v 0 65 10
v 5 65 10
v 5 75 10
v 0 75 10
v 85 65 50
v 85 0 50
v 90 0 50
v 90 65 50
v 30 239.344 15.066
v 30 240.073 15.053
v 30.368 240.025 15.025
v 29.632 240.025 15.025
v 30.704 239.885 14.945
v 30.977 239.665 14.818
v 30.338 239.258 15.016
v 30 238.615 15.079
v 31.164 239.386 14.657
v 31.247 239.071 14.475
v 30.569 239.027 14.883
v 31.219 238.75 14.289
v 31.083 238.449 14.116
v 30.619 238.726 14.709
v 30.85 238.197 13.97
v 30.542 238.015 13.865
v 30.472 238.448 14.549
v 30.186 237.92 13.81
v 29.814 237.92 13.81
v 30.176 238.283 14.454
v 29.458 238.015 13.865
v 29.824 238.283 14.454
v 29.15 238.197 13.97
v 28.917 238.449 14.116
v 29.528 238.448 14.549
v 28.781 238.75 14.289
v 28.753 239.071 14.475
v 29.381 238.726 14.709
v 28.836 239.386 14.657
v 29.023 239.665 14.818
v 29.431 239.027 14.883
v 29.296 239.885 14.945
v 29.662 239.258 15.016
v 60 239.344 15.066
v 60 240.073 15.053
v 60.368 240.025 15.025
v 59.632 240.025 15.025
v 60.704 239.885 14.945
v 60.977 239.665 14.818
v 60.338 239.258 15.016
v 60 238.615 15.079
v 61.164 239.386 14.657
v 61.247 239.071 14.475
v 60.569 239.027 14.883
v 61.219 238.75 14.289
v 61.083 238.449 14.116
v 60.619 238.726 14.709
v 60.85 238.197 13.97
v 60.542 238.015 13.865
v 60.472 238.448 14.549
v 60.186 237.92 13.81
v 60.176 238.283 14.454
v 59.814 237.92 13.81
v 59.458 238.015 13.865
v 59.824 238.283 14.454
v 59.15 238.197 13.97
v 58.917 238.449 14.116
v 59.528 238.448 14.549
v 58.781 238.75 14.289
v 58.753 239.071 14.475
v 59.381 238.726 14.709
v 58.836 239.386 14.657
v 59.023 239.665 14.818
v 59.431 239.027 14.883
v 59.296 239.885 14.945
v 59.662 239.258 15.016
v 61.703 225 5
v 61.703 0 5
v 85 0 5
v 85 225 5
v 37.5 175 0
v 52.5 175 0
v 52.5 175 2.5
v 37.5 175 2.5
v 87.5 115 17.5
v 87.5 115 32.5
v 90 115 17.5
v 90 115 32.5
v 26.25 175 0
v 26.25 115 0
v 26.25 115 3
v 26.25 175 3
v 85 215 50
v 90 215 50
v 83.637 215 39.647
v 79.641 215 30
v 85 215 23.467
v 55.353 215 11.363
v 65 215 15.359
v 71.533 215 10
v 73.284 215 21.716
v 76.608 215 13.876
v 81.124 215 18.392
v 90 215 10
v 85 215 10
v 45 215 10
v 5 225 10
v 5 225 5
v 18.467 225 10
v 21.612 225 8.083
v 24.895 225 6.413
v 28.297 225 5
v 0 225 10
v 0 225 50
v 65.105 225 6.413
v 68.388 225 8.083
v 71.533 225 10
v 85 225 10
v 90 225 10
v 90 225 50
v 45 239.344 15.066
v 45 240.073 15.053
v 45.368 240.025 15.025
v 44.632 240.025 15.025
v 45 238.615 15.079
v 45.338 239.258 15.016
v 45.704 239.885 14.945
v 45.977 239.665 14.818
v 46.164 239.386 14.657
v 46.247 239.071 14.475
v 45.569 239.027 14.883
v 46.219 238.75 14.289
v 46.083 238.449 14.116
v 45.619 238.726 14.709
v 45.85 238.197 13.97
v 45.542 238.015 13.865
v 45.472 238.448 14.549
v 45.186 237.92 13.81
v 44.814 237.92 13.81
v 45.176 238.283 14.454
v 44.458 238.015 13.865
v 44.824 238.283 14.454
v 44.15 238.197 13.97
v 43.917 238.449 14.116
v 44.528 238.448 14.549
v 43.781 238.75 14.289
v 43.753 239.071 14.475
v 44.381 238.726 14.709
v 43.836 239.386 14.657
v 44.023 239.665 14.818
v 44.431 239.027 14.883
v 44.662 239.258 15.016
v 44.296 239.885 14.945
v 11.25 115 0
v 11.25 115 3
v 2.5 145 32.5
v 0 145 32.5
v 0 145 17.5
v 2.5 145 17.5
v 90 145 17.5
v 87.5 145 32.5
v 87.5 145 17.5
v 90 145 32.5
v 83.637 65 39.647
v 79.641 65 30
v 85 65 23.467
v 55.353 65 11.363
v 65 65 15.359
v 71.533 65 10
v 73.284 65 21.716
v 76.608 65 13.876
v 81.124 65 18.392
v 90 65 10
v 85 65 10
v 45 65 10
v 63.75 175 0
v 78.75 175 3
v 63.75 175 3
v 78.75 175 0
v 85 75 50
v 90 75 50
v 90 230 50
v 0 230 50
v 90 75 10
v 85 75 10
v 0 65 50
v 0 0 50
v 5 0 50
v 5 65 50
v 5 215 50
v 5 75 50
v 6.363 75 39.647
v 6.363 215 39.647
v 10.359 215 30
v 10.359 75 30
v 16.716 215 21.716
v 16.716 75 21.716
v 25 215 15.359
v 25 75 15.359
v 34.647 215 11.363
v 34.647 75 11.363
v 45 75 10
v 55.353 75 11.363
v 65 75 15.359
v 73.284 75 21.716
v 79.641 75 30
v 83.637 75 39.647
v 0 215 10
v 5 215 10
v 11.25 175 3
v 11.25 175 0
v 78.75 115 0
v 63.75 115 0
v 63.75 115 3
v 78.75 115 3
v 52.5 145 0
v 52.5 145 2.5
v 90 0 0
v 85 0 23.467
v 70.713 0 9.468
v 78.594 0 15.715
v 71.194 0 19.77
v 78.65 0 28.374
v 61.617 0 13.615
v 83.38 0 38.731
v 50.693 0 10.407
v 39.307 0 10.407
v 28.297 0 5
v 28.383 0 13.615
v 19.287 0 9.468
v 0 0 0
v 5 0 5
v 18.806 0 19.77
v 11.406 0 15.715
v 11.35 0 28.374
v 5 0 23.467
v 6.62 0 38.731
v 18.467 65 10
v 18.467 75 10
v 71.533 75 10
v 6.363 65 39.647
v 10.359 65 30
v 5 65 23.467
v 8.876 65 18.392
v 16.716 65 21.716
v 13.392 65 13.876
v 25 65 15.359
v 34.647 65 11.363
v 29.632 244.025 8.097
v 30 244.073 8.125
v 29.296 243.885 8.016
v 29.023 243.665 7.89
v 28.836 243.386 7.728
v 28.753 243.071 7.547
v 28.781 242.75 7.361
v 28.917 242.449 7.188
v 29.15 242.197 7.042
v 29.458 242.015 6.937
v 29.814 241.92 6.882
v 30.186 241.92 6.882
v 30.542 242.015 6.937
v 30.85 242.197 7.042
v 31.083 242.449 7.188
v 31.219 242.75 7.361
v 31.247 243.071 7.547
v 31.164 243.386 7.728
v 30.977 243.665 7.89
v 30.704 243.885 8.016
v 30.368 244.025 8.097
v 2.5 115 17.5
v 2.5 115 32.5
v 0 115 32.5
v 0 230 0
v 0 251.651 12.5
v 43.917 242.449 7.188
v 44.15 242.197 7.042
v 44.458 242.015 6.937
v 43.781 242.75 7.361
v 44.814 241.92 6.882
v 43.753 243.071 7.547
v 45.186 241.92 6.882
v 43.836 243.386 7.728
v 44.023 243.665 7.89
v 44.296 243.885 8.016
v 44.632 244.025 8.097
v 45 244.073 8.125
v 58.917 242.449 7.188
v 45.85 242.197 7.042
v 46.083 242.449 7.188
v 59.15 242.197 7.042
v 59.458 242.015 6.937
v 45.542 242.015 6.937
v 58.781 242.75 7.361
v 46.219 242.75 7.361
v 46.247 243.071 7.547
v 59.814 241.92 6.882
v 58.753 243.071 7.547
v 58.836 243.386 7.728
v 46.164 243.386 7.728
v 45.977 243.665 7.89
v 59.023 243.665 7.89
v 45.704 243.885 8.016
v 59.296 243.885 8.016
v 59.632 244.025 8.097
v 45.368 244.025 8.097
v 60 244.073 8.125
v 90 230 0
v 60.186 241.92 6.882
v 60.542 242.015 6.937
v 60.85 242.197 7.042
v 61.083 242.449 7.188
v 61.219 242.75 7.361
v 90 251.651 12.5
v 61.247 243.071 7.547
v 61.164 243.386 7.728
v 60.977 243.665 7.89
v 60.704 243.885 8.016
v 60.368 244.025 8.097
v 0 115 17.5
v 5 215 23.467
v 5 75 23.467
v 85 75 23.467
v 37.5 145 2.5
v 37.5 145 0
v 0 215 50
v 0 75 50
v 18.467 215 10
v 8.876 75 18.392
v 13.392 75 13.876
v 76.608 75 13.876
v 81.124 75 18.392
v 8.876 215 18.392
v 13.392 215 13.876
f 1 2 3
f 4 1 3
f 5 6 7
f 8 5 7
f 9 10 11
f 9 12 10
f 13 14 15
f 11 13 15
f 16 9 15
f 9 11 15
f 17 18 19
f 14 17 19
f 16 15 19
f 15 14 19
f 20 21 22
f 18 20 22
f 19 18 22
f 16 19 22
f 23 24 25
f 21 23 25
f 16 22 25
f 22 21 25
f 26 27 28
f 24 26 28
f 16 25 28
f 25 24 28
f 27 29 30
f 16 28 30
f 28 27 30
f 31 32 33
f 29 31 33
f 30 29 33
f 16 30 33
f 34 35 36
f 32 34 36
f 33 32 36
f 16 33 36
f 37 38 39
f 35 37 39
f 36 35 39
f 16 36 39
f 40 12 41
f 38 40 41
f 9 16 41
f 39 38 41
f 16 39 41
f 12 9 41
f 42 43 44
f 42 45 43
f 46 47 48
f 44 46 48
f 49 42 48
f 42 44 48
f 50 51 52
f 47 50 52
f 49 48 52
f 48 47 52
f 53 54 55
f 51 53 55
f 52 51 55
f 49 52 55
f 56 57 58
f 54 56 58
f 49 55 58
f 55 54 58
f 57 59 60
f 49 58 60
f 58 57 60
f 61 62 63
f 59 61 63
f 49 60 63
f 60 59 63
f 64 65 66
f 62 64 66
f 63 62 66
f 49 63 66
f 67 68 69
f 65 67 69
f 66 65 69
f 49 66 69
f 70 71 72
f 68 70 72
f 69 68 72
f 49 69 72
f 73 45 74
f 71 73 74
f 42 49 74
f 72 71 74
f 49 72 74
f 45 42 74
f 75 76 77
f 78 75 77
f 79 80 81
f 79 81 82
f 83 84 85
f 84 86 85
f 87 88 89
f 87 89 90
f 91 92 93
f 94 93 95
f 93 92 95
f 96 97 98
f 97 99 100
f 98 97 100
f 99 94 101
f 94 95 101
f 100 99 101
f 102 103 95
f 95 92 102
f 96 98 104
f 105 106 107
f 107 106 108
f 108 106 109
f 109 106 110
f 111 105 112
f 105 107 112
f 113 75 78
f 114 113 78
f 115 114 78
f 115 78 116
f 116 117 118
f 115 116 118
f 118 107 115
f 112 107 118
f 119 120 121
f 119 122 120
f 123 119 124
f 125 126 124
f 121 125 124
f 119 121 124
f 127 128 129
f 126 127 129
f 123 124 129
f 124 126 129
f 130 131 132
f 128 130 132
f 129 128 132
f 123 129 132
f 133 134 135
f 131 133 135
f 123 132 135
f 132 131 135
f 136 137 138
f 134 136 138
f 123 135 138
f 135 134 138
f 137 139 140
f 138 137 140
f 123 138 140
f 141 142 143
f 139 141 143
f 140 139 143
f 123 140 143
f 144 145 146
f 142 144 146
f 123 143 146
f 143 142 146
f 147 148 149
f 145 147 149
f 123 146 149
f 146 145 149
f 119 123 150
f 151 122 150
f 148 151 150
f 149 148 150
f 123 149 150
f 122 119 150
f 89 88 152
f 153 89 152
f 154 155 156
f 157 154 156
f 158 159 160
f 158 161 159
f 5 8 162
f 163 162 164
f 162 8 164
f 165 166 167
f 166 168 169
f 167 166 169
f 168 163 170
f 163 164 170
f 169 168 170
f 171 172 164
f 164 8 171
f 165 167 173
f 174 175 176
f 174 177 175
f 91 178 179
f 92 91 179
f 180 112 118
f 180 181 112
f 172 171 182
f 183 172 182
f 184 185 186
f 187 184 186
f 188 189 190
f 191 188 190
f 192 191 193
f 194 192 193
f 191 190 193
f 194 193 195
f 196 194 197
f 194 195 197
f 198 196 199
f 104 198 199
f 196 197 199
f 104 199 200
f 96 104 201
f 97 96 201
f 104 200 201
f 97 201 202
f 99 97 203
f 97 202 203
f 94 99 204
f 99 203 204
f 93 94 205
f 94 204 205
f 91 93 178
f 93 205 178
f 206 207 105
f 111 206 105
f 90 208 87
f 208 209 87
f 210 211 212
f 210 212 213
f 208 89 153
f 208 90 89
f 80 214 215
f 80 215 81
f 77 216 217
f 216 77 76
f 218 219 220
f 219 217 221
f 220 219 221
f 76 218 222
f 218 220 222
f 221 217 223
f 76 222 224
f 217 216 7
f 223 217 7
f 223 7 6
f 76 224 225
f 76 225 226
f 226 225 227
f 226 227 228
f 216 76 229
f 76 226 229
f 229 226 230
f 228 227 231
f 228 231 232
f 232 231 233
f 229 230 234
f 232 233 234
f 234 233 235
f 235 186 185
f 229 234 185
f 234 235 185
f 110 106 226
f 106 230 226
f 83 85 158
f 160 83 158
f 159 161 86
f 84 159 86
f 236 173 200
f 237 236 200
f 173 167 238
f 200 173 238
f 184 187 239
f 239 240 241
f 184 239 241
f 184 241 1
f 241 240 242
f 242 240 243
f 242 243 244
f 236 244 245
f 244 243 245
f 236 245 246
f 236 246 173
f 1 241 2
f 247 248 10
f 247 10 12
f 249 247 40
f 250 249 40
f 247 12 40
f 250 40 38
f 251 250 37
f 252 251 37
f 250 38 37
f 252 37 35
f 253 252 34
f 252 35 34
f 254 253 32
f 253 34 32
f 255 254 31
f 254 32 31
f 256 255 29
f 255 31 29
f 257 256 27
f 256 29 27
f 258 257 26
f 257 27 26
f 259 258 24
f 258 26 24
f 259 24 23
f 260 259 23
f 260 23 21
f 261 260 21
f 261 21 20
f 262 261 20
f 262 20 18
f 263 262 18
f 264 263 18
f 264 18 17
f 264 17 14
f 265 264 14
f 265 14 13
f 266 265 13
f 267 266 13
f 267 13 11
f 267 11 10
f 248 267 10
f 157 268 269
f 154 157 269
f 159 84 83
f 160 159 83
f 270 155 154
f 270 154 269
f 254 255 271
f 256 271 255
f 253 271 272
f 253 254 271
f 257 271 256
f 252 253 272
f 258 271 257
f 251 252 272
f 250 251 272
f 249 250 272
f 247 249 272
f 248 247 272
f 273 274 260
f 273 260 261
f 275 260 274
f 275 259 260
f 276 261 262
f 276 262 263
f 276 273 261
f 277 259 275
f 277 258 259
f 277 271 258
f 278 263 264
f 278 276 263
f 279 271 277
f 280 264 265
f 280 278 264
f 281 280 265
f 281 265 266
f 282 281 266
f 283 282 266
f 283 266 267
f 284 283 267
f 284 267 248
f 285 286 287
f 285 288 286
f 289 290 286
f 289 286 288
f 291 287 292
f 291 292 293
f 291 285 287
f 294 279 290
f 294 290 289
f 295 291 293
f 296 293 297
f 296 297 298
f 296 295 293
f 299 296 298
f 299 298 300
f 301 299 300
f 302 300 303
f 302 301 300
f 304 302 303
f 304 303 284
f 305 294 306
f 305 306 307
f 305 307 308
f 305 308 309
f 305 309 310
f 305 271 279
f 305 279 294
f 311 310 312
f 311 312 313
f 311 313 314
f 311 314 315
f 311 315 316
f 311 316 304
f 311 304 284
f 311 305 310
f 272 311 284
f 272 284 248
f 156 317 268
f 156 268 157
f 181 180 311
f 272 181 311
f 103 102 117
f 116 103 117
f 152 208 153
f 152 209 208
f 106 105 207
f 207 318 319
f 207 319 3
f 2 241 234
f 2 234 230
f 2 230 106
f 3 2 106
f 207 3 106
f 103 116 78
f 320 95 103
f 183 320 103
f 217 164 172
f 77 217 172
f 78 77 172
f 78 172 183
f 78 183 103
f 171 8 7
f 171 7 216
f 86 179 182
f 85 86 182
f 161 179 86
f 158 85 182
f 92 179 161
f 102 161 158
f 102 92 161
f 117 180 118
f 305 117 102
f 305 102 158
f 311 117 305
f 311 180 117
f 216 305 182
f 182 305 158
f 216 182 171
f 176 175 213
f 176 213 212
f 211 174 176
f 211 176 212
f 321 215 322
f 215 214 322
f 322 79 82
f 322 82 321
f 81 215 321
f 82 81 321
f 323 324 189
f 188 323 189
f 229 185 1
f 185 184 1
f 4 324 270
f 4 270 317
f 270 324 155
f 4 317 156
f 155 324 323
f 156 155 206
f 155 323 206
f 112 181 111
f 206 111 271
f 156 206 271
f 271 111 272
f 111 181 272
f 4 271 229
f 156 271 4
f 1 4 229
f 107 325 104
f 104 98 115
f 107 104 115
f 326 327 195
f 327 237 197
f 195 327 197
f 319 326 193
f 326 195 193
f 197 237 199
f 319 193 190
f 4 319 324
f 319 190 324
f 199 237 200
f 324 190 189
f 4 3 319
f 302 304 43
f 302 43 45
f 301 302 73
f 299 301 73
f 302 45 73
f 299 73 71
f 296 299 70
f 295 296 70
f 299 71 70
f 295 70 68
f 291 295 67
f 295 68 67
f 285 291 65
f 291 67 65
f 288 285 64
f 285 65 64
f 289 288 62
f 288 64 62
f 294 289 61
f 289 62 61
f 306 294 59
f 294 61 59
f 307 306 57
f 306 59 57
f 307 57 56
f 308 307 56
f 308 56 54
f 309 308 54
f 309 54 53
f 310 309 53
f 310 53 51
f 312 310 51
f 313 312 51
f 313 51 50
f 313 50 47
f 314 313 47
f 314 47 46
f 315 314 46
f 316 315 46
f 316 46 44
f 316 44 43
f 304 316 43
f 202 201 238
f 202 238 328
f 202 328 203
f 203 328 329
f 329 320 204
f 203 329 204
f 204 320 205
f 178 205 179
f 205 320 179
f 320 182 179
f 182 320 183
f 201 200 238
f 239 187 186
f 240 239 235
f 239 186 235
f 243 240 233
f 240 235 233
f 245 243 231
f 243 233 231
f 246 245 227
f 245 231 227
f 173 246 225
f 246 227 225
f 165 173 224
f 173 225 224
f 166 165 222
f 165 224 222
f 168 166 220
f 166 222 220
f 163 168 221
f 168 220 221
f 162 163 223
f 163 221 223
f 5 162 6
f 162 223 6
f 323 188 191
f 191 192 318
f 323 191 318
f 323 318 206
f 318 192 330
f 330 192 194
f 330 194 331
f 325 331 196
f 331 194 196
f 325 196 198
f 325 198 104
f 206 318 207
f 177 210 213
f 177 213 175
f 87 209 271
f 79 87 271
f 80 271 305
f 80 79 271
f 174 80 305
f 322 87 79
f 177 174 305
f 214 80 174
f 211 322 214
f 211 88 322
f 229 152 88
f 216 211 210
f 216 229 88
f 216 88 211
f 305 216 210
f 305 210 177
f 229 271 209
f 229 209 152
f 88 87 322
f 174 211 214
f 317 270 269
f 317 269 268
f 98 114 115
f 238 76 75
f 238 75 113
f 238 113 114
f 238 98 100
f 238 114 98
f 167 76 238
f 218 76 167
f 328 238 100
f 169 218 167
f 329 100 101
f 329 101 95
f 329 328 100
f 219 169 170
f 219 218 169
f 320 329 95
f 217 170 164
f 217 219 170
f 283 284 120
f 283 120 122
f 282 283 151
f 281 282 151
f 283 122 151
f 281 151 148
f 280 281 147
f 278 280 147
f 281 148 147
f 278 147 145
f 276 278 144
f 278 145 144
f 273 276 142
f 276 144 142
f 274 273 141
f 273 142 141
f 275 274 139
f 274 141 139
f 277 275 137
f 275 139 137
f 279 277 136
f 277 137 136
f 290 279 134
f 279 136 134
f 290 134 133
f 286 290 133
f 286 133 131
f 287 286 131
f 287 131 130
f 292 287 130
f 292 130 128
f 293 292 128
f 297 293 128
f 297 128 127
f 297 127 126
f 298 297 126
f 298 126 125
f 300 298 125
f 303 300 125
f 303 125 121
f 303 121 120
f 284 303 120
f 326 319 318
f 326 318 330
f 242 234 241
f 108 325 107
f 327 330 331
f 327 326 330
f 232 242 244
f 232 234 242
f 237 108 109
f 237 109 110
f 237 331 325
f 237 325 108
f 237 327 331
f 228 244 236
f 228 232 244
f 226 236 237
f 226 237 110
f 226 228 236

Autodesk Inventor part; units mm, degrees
ref_plane "YZ Plane" through (0, 0, 0) normal (1, 0, 0) x (0, 1, 0)
ref_plane "XZ Plane" through (0, 0, 0) normal (0, 1, 0) x (-1, 0, 0)
ref_plane "XY Plane" through (0, 0, 0) normal (0, 0, 1) x (1, 0, 0)
sketch "スケッチ1" plane through (0, 0, 0) normal (0, 1, 0) x (-1, 0, 0)
  line L0 (0, 0) -> (-90, 0)
  line L1 (-90, 0) -> (-90, 50)
  line L2 (0, 50) -> (0, 0)
  line L3 (0, 0) -> (-5, 0)
  line L4 (-5, 0) -> (-5, 50)
  line L5 (-5, 0) -> (-90, 0)
  line L6 (-90, 0) -> (-85, 0)
  line L7 (-85, 0) -> (-85, 50)
  arc A0 (-85, 50) -> (-5, 50) centre (-45, 50) ccw
  line L8 (0, 0) -> (0, 10)
  line L9 (0, 10) -> (-90, 10)
  circle A1 centre (-45, 50) radius 45
  line L10 (-90, 5) -> (0, 5)
  line L11 (-90, 50) -> (-85, 50)
  line L12 (-5, 50) -> (0, 50)
  line L13 (0, 0) -> (-90, 0)
  line L14 (-90, 0) -> (-90, 5)
  line L15 (-90, 5) -> (0, 5)
  line L16 (0, 5) -> (0, 0)
  dimension "d0" = 90
  dimension "d1" = 50
  dimension "d2" = 5
  dimension "d3" = 85
  dimension "d4" = 5
  dimension "d5" = 80
  dimension "d6" = 10
  dimension "d7" = 90
extrude "押し出し1" add sketch "スケッチ1" along normal blind 230 contours L0 L4 L10 L2 | L0 L7 L10 L4 | L10 L4 L9 L2 | L0 L1 L10 L7 | L10 A1 L9 L4 | L9 L4 A1 L2 | L10 L1 L9 L7 | L7 L9 A1 L10 | L9 A1 L4 | A1 L9 | A1 L4 L12 | L9 L1 A1 L7 | L7 A1 L9 | A1 L9 A0 L4 | A1 L7 A0 L9 | L11 L7 A1
sketch "スケッチ2" plane through (0, 0, 0) normal (0, -1, 0) x (1, 0, 0)
  line L0 (0, 0) -> (0, 50) projected
  line L1 (90, 0) -> (0, 0) projected
  line L2 (90, 50) -> (90, 0) projected
  line L3 (85, 50) -> (90, 50) projected
  arc A0 (5, 50) -> (85, 50) centre (45, 50) ccw projected
  line L4 (0, 50) -> (5, 50) projected
  arc A1 (5, 23.467) -> (85, 23.467) centre (45, 50) ccw
  line L5 (0, 5) -> (90, 5)
  line L6 (5, 23.467) -> (5, 5)
  line L7 (85, 23.467) -> (85, 5)
  dimension "d29" = 48
extrude "押し出し2" cut sketch "スケッチ2" against normal blind 225 contours L6 A1 L5 | L5 A1 L7
sketch "スケッチ3" plane through (0, 230, 0) normal (0, 1, 0) x (1, 0, 0)
  arc A0 (85, -50) -> (5, -50) centre (45, -50) ccw projected
  line L0 (90, -50) -> (90, 0) projected
  line L1 (0, -50) -> (5, -50) projected
  arc A1 (85, -50) -> (5, -50) centre (45, -50) ccw
  line L2 (5, -50) -> (85, -50)
extrude "押し出し3" add sketch "スケッチ3" against normal blind 5
sketch "スケッチ4" plane through (90, 0, 50) normal (1, 0, 0) x (0, 0, -1)
  line L0 (0, 0) -> (50, 0) projected
  line L1 (0, 0) -> (0, 230) projected
  line L2 (25, 0) -> (25, 65)
  line L3 (25, 65) -> (25, 75)
  line L4 (25, 75) -> (25, 215)
  line L5 (25, 215) -> (25, 225)
  line L6 (0, 65) -> (40, 65)
  line L7 (40, 65) -> (40, 75)
  line L8 (40, 75) -> (0, 75)
  line L9 (0, 75) -> (0, 65)
  line L10 (0, 215) -> (40, 215)
  line L11 (40, 215) -> (40, 225)
  line L12 (40, 225) -> (0, 225)
  line L13 (0, 225) -> (0, 215)
  dimension "d16" = 65
  dimension "d17" = 10
  dimension "d18" = 140
  dimension "d19" = 10
  dimension "d20" = 40
extrude "押し出し4" cut sketch "スケッチ4" against normal blind 90 contours L1 L8 L3 L6 | L3 L8 L7 L6 | L1 L12 L5 L10 | L5 L12 L11 L10
sketch "スケッチ6" plane through (90, 0, 50) normal (1, 0, 0) x (0, 0, -1)
  line L0 (0, 230) -> (50, 230) projected
  line L1 (50, 230) -> (37.5, 251.6506)
  line L2 (50, 230) -> (110, 230) construction
  line L3 (0, 230) -> (37.5, 251.6506)
  line L4 (0, 230) -> (43.3013, 230) construction
  dimension "d32" = 120
  dimension "d33" = 30
extrude "押し出し6" add sketch "スケッチ6" against normal blind 90
sketch "スケッチ9" plane through (0, 0, 0) normal (-1, 0, 0) x (0, 0, 1)
  line L0 (10, 225) -> (50, 225) projected
  line L1 (50, 225) -> (50, 230) projected
  line L2 (50, 230) -> (12.5, 251.6506) projected
  line L3 (12.5, 251.6506) -> (0, 230) projected
  line L4 (0, 0) -> (0, 230) projected
  line L5 (0, 0) -> (50, 0) projected
  line L6 (50, 0) -> (50, 65) projected
  line L7 (50, 65) -> (10, 65) projected
  line L8 (10, 65) -> (10, 75) projected
  line L9 (10, 75) -> (50, 75) projected
  line L10 (50, 75) -> (50, 215) projected
  line L11 (50, 215) -> (10, 215) projected
  line L12 (10, 215) -> (10, 225) projected
  line L13 (12.5, 251.6506) -> (0, 230)
  line L14 (0, 230) -> (-132.7906, 0)
  line L15 (0, 145) -> (-49.0748, 145)
  line L16 (0, 115) -> (-66.3953, 115)
  dimension "d45" = 30
sketch "スケッチ10" plane through (0, 0, 0) normal (-1, 0, 0) x (0, 0, 1)
  line L0 (10, 225) -> (50, 225) projected
  line L1 (50, 225) -> (50, 230) projected
  line L2 (50, 230) -> (12.5, 251.6506) projected
  line L3 (12.5, 251.6506) -> (0, 230) projected
  line L4 (0, 0) -> (0, 230) projected
  line L5 (0, 0) -> (50, 0) projected
  line L6 (50, 0) -> (50, 65) projected
  line L7 (50, 65) -> (10, 65) projected
  line L8 (10, 65) -> (10, 75) projected
  line L9 (10, 75) -> (50, 75) projected
  line L10 (50, 75) -> (50, 215) projected
  line L11 (50, 215) -> (10, 215) projected
  line L12 (10, 215) -> (10, 225) projected
  line L13 (12.5, 251.6506) -> (-87.5, 78.4456)
  line L14 (-87.5, 78.4456) -> (50, 0)
sketch "スケッチ11" plane through (90, 230, 0) normal (0, 0.5, -0.866) x (-1, 0, 0)
  line L0 (0, 25) -> (90, 25) projected
  line L1 (45, 25) -> (45, 15)
  line L2 (45, 15) -> (60, 15)
  line L3 (60, 15) -> (30, 15)
  point P0 (90, -199.1858)
  dimension "d49" = 10
  dimension "d50" = 15
  dimension "d51" = 30
hole "穴1" at (45, 242.9904, 7.5) at (30, 242.9904, 7.5) at (60, 242.9904, 7.5) direction (0, -0.5, 0.866) diameter 2.5 depth 8 tip angle 118
sketch "スケッチ12" plane through (90, 0, 50) normal (1, 0, 0) x (0, 0, -1)
  line L0 (50, 0) -> (50, 230) projected
  line L1 (40, 225) -> (40, 215) projected
  line L2 (0, 215) -> (0, 75)
  line L3 (0, 145) -> (50, 145)
  line L4 (32.5, 175) -> (17.5, 175)
  line L5 (17.5, 175) -> (17.5, 115)
  line L6 (17.5, 115) -> (32.5, 115)
  line L7 (32.5, 115) -> (32.5, 175)
  line L8 (32.5, 175) -> (17.5, 115) construction
  line L9 (17.5, 175) -> (32.5, 115) construction
  line L10 (17.5, 145) -> (32.5, 145)
  line L11 (32.5, 145) -> (32.5, 115)
  line L12 (32.5, 115) -> (17.5, 115)
  line L13 (17.5, 115) -> (17.5, 145)
  point P0 (25, 145)
  dimension "d59" = 15
  dimension "d60" = 60
extrude "押し出し8" cut sketch "スケッチ12" against normal blind 2.5 contours L3 L7 L6 L5
sketch "スケッチ13" plane through (0, 0, 0) normal (-1, 0, 0) x (0, 0, 1)
  line L0 (0, 0) -> (0, 230) projected
  line L1 (50, 75) -> (50, 215) projected
  line L2 (50, 145) -> (0, 145)
  line L3 (17.5, 175) -> (32.5, 175)
  line L4 (32.5, 175) -> (32.5, 115)
  line L5 (32.5, 115) -> (17.5, 115)
  line L6 (17.5, 115) -> (17.5, 175)
  line L7 (17.5, 175) -> (32.5, 115) construction
  line L8 (32.5, 175) -> (17.5, 115) construction
  line L9 (17.5, 145) -> (32.5, 145)
  line L10 (32.5, 145) -> (32.5, 115)
  line L11 (32.5, 115) -> (17.5, 115)
  line L12 (17.5, 115) -> (17.5, 145)
  point P0 (25, 145)
  dimension "d63" = 15
  dimension "d64" = 60
extrude "押し出し9" cut sketch "スケッチ13" against normal blind 2.5 contours L4 L5 L6 L2
sketch "スケッチ14" plane through (90, 0, 0) normal (0, 0, -1) x (-1, 0, 0)
  line L0 (90, 0) -> (90, 230) projected
  line L1 (0, 0) -> (0, 230) projected
  line L2 (0, 145) -> (90, 145)
  line L3 (37.5, 175) -> (52.5, 175)
  line L4 (52.5, 175) -> (52.5, 115)
  line L5 (52.5, 115) -> (37.5, 115)
  line L6 (37.5, 115) -> (37.5, 175)
  line L7 (37.5, 175) -> (52.5, 115) construction
  line L8 (52.5, 175) -> (37.5, 115) construction
  line L9 (37.5, 145) -> (52.5, 145)
  line L10 (52.5, 145) -> (52.5, 175)
  line L11 (52.5, 175) -> (37.5, 175)
  line L12 (37.5, 175) -> (37.5, 145)
  point P0 (45, 145)
  dimension "d67" = 15
  dimension "d70" = 30
extrude "押し出し10" cut sketch "スケッチ14" against normal blind 2.5 contours L6 L3 L4 L2
sketch "スケッチ16" plane through (90, 0, 0) normal (0, 0, -1) x (-1, 0, 0)
  line L0 (52.5, 175) -> (52.5, 145) projected
  line L1 (52.5, 145) -> (37.5, 145) projected
  line L2 (37.5, 145) -> (37.5, 175) projected
  line L3 (90, 0) -> (90, 230) projected
  line L4 (0, 0) -> (0, 230) projected
  line L5 (0, 145) -> (90, 145)
  line L6 (0, 160) -> (37.5, 160)
  line L7 (52.5, 160) -> (90, 160)
  line L8 (18.75, 160) -> (18.75, 145)
  line L9 (71.25, 145) -> (71.25, 160)
  line L10 (11.25, 175) -> (26.25, 175)
  line L11 (26.25, 175) -> (26.25, 115)
  line L12 (26.25, 115) -> (11.25, 115)
  line L13 (11.25, 115) -> (11.25, 175)
  line L14 (11.25, 175) -> (26.25, 115) construction
  line L15 (26.25, 175) -> (11.25, 115) construction
  line L16 (11.25, 115) -> (26.25, 115)
  line L17 (26.25, 115) -> (26.25, 175)
  line L18 (26.25, 175) -> (11.25, 175)
  line L19 (11.25, 175) -> (11.25, 115)
  line L20 (45, 145) -> (45, 125)
  line L21 (78.75, 175) -> (63.75, 175)
  line L22 (63.75, 115) -> (78.75, 115)
  line L23 (78.75, 175) -> (78.75, 115)
  line L24 (63.75, 115) -> (63.75, 175)
  line L25 (63.75, 175) -> (78.75, 175)
  line L26 (78.75, 175) -> (78.75, 115)
  line L27 (78.75, 115) -> (63.75, 115)
  line L28 (63.75, 115) -> (63.75, 175)
  line L29 (11.25, 115) -> (26.25, 115)
  line L30 (26.25, 115) -> (26.25, 175)
  line L31 (26.25, 175) -> (11.25, 175)
  line L32 (11.25, 175) -> (11.25, 115)
  dimension "d71" = 15
  dimension "d72" = 60
  dimension "d73" = 20
extrude "押し出し11" cut sketch "スケッチ16" against normal blind 3 contours L24 L21 L23 L7 | L7 L9 L5 L24 | L5 L23 L22 L24 | L7 L23 L5 L9 | L11 L12 L13 L5 | L5 L8 L6 L11 | L6 L13 L10 L11 | L5 L13 L6 L8
sketch "スケッチ17" plane through (37.5, 145, 0) normal (0, 1, 0) x (1, 0, 0)
  line L0 (0, 0) -> (15, 0) projected
  line L1 (0, 0) -> (0, -2.5) projected
  line L2 (0, -2.5) -> (15, -2.5) projected
  line L3 (15, 0) -> (15, -2.5) projected
  line L4 (-57.7643, 16.522) -> (69.053, 16.522)
  line L5 (69.053, 16.522) -> (69.053, -65.9751)
  line L6 (69.053, -65.9751) -> (-57.7643, -65.9751)
  line L7 (-57.7643, -65.9751) -> (-57.7643, 16.522)
  point P0 (-37.5, 0)
properties part number "知能ロボコン発射台２．３" material "ABS プラスチック"
